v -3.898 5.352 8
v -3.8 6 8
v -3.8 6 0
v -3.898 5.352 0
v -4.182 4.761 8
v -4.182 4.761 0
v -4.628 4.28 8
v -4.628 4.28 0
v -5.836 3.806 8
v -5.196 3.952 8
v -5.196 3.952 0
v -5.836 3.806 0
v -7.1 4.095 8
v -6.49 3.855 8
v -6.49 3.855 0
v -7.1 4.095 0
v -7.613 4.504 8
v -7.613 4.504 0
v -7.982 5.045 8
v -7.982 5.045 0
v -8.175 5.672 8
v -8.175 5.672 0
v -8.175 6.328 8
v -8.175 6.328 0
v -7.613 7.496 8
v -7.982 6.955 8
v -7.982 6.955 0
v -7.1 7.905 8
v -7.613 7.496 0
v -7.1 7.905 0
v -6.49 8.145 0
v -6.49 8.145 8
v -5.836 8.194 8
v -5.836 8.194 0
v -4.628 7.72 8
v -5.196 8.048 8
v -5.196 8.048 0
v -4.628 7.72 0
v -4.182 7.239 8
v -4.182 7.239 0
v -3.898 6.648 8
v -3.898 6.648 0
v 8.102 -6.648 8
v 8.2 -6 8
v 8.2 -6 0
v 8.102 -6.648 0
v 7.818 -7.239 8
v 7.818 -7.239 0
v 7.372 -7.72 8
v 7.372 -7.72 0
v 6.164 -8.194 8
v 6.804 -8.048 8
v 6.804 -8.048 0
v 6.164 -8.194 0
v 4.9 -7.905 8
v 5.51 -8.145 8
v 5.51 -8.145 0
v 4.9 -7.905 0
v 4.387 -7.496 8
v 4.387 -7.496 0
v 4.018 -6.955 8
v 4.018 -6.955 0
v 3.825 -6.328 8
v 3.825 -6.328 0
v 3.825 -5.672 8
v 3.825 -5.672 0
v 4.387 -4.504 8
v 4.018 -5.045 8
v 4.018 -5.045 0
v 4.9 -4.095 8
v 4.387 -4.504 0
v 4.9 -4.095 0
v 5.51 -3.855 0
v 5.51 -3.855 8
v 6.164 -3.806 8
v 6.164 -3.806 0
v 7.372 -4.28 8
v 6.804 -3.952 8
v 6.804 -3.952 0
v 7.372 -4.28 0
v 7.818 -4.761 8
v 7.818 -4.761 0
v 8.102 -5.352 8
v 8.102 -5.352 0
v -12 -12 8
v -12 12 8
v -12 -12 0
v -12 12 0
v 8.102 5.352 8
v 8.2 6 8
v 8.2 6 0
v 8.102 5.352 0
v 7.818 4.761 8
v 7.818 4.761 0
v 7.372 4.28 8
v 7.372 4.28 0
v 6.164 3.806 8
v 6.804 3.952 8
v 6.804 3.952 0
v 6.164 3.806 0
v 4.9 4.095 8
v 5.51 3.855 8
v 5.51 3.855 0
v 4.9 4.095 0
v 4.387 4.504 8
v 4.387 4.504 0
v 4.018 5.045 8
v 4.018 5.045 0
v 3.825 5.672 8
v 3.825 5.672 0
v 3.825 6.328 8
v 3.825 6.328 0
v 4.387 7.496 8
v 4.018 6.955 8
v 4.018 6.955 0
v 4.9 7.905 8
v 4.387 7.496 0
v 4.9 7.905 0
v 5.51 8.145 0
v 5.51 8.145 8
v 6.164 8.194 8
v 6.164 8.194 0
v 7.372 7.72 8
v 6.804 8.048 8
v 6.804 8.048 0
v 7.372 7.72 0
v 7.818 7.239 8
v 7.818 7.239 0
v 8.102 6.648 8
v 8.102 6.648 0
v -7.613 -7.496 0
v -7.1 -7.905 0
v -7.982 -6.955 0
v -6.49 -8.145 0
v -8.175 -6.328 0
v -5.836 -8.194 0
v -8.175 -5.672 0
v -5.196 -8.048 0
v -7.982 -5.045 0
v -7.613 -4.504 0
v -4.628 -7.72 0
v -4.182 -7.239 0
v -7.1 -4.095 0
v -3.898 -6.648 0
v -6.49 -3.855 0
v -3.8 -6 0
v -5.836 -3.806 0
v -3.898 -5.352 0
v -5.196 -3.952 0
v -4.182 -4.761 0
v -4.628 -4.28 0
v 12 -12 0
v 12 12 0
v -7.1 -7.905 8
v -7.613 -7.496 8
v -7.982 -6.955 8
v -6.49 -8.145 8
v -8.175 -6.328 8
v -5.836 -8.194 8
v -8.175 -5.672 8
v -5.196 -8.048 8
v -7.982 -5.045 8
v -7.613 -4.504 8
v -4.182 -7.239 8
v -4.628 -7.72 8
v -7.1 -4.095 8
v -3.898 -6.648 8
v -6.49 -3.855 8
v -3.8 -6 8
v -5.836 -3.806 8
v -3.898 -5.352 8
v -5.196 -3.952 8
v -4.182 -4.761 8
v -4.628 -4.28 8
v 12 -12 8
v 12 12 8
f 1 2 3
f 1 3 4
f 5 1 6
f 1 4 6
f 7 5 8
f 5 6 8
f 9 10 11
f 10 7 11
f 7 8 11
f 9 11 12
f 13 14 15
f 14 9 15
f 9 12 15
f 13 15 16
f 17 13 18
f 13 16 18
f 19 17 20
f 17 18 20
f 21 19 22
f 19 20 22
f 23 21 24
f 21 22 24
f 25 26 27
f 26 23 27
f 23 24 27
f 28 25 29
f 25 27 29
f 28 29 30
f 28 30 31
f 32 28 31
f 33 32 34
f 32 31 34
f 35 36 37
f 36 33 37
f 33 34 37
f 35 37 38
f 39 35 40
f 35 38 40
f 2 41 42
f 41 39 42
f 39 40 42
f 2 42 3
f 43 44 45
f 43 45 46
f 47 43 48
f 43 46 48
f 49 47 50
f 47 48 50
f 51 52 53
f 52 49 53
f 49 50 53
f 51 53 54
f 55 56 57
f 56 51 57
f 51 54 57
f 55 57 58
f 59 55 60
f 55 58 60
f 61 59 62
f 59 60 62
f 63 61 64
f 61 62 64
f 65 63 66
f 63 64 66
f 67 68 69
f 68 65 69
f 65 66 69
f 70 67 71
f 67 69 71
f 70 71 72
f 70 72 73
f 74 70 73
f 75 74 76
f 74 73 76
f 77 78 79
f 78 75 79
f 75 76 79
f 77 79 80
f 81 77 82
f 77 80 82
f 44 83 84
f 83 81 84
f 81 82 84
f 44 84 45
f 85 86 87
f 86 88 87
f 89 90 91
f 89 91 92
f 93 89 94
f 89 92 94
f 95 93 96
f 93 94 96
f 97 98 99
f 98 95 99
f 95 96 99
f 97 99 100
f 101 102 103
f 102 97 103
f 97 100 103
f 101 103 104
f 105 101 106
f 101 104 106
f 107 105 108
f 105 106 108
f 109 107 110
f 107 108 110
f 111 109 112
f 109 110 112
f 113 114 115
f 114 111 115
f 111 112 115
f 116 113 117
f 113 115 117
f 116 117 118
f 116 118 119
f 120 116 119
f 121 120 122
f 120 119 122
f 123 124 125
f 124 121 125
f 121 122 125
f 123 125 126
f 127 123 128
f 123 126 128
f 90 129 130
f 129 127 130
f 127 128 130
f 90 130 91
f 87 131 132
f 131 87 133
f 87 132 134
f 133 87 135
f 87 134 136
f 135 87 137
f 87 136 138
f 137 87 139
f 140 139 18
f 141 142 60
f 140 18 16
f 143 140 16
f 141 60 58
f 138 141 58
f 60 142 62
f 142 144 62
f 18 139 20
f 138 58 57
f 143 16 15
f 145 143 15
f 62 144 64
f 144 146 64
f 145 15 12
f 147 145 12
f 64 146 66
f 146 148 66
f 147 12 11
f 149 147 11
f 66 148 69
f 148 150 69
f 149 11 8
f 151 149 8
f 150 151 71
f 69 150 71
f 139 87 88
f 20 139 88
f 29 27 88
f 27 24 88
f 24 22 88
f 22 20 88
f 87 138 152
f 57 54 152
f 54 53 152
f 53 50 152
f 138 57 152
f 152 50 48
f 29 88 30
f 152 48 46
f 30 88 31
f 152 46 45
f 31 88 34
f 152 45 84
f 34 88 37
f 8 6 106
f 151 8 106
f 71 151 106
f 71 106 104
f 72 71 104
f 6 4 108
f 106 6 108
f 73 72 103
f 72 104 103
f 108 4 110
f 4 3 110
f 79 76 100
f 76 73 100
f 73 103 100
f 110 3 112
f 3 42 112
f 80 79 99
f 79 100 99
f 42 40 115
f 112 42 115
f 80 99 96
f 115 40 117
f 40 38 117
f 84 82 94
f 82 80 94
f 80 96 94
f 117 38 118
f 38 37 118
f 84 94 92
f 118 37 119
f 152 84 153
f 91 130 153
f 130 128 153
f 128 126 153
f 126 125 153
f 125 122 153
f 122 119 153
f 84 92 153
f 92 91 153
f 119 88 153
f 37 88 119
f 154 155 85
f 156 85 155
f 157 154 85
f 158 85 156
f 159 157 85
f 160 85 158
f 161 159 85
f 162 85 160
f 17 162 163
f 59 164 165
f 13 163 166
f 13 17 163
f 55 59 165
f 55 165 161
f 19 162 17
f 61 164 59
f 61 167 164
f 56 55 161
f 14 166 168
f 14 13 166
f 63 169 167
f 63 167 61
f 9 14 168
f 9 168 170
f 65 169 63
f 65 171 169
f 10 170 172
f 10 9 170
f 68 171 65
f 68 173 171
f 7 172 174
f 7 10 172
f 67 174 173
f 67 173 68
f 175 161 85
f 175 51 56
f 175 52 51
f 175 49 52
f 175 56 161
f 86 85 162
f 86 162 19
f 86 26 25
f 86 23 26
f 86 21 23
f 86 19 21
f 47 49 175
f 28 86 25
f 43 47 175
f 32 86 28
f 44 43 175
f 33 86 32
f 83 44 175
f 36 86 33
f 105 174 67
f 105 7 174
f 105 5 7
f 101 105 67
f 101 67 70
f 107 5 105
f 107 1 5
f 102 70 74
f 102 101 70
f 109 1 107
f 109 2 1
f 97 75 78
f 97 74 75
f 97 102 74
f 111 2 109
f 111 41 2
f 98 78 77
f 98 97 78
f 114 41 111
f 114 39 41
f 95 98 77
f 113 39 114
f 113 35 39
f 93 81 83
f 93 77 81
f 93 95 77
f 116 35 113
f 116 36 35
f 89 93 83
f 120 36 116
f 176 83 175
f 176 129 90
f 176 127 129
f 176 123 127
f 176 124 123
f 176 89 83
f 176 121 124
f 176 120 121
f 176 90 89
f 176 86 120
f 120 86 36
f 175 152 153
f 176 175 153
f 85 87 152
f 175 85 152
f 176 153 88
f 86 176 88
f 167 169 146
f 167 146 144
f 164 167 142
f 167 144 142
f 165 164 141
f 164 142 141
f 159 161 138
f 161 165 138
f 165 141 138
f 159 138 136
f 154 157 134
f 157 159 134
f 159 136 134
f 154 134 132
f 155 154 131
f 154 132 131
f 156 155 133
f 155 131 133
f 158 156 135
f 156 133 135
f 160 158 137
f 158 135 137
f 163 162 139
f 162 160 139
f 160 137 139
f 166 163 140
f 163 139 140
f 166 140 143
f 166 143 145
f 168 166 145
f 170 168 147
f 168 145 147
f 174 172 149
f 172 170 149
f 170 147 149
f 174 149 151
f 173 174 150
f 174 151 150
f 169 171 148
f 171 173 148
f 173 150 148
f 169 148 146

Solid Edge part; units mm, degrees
sketch "Sketch1" plane through (0, 0, 0) normal (0, 0, 1) x (1, 0, 0)
  circle A0 centre (6, 6) radius 2.2
  circle A1 centre (6, -6) radius 2.2
  circle A2 centre (-6, -6) radius 2.2
  line L0 (-12, -12) -> (12, -12)
  line L1 (12, -12) -> (12, 12)
  line L2 (12, 12) -> (-12, 12)
  line L3 (-12, 12) -> (-12, -12)
  circle A3 centre (-6, 6) radius 2.2
  dimension "D1" = 24
  dimension "D2" = 24
  dimension "D3" = 4.4
extrude "Protrusion1" add sketch "Sketch1" along normal blind 8
properties material "ABS Plastic, medium impact"
